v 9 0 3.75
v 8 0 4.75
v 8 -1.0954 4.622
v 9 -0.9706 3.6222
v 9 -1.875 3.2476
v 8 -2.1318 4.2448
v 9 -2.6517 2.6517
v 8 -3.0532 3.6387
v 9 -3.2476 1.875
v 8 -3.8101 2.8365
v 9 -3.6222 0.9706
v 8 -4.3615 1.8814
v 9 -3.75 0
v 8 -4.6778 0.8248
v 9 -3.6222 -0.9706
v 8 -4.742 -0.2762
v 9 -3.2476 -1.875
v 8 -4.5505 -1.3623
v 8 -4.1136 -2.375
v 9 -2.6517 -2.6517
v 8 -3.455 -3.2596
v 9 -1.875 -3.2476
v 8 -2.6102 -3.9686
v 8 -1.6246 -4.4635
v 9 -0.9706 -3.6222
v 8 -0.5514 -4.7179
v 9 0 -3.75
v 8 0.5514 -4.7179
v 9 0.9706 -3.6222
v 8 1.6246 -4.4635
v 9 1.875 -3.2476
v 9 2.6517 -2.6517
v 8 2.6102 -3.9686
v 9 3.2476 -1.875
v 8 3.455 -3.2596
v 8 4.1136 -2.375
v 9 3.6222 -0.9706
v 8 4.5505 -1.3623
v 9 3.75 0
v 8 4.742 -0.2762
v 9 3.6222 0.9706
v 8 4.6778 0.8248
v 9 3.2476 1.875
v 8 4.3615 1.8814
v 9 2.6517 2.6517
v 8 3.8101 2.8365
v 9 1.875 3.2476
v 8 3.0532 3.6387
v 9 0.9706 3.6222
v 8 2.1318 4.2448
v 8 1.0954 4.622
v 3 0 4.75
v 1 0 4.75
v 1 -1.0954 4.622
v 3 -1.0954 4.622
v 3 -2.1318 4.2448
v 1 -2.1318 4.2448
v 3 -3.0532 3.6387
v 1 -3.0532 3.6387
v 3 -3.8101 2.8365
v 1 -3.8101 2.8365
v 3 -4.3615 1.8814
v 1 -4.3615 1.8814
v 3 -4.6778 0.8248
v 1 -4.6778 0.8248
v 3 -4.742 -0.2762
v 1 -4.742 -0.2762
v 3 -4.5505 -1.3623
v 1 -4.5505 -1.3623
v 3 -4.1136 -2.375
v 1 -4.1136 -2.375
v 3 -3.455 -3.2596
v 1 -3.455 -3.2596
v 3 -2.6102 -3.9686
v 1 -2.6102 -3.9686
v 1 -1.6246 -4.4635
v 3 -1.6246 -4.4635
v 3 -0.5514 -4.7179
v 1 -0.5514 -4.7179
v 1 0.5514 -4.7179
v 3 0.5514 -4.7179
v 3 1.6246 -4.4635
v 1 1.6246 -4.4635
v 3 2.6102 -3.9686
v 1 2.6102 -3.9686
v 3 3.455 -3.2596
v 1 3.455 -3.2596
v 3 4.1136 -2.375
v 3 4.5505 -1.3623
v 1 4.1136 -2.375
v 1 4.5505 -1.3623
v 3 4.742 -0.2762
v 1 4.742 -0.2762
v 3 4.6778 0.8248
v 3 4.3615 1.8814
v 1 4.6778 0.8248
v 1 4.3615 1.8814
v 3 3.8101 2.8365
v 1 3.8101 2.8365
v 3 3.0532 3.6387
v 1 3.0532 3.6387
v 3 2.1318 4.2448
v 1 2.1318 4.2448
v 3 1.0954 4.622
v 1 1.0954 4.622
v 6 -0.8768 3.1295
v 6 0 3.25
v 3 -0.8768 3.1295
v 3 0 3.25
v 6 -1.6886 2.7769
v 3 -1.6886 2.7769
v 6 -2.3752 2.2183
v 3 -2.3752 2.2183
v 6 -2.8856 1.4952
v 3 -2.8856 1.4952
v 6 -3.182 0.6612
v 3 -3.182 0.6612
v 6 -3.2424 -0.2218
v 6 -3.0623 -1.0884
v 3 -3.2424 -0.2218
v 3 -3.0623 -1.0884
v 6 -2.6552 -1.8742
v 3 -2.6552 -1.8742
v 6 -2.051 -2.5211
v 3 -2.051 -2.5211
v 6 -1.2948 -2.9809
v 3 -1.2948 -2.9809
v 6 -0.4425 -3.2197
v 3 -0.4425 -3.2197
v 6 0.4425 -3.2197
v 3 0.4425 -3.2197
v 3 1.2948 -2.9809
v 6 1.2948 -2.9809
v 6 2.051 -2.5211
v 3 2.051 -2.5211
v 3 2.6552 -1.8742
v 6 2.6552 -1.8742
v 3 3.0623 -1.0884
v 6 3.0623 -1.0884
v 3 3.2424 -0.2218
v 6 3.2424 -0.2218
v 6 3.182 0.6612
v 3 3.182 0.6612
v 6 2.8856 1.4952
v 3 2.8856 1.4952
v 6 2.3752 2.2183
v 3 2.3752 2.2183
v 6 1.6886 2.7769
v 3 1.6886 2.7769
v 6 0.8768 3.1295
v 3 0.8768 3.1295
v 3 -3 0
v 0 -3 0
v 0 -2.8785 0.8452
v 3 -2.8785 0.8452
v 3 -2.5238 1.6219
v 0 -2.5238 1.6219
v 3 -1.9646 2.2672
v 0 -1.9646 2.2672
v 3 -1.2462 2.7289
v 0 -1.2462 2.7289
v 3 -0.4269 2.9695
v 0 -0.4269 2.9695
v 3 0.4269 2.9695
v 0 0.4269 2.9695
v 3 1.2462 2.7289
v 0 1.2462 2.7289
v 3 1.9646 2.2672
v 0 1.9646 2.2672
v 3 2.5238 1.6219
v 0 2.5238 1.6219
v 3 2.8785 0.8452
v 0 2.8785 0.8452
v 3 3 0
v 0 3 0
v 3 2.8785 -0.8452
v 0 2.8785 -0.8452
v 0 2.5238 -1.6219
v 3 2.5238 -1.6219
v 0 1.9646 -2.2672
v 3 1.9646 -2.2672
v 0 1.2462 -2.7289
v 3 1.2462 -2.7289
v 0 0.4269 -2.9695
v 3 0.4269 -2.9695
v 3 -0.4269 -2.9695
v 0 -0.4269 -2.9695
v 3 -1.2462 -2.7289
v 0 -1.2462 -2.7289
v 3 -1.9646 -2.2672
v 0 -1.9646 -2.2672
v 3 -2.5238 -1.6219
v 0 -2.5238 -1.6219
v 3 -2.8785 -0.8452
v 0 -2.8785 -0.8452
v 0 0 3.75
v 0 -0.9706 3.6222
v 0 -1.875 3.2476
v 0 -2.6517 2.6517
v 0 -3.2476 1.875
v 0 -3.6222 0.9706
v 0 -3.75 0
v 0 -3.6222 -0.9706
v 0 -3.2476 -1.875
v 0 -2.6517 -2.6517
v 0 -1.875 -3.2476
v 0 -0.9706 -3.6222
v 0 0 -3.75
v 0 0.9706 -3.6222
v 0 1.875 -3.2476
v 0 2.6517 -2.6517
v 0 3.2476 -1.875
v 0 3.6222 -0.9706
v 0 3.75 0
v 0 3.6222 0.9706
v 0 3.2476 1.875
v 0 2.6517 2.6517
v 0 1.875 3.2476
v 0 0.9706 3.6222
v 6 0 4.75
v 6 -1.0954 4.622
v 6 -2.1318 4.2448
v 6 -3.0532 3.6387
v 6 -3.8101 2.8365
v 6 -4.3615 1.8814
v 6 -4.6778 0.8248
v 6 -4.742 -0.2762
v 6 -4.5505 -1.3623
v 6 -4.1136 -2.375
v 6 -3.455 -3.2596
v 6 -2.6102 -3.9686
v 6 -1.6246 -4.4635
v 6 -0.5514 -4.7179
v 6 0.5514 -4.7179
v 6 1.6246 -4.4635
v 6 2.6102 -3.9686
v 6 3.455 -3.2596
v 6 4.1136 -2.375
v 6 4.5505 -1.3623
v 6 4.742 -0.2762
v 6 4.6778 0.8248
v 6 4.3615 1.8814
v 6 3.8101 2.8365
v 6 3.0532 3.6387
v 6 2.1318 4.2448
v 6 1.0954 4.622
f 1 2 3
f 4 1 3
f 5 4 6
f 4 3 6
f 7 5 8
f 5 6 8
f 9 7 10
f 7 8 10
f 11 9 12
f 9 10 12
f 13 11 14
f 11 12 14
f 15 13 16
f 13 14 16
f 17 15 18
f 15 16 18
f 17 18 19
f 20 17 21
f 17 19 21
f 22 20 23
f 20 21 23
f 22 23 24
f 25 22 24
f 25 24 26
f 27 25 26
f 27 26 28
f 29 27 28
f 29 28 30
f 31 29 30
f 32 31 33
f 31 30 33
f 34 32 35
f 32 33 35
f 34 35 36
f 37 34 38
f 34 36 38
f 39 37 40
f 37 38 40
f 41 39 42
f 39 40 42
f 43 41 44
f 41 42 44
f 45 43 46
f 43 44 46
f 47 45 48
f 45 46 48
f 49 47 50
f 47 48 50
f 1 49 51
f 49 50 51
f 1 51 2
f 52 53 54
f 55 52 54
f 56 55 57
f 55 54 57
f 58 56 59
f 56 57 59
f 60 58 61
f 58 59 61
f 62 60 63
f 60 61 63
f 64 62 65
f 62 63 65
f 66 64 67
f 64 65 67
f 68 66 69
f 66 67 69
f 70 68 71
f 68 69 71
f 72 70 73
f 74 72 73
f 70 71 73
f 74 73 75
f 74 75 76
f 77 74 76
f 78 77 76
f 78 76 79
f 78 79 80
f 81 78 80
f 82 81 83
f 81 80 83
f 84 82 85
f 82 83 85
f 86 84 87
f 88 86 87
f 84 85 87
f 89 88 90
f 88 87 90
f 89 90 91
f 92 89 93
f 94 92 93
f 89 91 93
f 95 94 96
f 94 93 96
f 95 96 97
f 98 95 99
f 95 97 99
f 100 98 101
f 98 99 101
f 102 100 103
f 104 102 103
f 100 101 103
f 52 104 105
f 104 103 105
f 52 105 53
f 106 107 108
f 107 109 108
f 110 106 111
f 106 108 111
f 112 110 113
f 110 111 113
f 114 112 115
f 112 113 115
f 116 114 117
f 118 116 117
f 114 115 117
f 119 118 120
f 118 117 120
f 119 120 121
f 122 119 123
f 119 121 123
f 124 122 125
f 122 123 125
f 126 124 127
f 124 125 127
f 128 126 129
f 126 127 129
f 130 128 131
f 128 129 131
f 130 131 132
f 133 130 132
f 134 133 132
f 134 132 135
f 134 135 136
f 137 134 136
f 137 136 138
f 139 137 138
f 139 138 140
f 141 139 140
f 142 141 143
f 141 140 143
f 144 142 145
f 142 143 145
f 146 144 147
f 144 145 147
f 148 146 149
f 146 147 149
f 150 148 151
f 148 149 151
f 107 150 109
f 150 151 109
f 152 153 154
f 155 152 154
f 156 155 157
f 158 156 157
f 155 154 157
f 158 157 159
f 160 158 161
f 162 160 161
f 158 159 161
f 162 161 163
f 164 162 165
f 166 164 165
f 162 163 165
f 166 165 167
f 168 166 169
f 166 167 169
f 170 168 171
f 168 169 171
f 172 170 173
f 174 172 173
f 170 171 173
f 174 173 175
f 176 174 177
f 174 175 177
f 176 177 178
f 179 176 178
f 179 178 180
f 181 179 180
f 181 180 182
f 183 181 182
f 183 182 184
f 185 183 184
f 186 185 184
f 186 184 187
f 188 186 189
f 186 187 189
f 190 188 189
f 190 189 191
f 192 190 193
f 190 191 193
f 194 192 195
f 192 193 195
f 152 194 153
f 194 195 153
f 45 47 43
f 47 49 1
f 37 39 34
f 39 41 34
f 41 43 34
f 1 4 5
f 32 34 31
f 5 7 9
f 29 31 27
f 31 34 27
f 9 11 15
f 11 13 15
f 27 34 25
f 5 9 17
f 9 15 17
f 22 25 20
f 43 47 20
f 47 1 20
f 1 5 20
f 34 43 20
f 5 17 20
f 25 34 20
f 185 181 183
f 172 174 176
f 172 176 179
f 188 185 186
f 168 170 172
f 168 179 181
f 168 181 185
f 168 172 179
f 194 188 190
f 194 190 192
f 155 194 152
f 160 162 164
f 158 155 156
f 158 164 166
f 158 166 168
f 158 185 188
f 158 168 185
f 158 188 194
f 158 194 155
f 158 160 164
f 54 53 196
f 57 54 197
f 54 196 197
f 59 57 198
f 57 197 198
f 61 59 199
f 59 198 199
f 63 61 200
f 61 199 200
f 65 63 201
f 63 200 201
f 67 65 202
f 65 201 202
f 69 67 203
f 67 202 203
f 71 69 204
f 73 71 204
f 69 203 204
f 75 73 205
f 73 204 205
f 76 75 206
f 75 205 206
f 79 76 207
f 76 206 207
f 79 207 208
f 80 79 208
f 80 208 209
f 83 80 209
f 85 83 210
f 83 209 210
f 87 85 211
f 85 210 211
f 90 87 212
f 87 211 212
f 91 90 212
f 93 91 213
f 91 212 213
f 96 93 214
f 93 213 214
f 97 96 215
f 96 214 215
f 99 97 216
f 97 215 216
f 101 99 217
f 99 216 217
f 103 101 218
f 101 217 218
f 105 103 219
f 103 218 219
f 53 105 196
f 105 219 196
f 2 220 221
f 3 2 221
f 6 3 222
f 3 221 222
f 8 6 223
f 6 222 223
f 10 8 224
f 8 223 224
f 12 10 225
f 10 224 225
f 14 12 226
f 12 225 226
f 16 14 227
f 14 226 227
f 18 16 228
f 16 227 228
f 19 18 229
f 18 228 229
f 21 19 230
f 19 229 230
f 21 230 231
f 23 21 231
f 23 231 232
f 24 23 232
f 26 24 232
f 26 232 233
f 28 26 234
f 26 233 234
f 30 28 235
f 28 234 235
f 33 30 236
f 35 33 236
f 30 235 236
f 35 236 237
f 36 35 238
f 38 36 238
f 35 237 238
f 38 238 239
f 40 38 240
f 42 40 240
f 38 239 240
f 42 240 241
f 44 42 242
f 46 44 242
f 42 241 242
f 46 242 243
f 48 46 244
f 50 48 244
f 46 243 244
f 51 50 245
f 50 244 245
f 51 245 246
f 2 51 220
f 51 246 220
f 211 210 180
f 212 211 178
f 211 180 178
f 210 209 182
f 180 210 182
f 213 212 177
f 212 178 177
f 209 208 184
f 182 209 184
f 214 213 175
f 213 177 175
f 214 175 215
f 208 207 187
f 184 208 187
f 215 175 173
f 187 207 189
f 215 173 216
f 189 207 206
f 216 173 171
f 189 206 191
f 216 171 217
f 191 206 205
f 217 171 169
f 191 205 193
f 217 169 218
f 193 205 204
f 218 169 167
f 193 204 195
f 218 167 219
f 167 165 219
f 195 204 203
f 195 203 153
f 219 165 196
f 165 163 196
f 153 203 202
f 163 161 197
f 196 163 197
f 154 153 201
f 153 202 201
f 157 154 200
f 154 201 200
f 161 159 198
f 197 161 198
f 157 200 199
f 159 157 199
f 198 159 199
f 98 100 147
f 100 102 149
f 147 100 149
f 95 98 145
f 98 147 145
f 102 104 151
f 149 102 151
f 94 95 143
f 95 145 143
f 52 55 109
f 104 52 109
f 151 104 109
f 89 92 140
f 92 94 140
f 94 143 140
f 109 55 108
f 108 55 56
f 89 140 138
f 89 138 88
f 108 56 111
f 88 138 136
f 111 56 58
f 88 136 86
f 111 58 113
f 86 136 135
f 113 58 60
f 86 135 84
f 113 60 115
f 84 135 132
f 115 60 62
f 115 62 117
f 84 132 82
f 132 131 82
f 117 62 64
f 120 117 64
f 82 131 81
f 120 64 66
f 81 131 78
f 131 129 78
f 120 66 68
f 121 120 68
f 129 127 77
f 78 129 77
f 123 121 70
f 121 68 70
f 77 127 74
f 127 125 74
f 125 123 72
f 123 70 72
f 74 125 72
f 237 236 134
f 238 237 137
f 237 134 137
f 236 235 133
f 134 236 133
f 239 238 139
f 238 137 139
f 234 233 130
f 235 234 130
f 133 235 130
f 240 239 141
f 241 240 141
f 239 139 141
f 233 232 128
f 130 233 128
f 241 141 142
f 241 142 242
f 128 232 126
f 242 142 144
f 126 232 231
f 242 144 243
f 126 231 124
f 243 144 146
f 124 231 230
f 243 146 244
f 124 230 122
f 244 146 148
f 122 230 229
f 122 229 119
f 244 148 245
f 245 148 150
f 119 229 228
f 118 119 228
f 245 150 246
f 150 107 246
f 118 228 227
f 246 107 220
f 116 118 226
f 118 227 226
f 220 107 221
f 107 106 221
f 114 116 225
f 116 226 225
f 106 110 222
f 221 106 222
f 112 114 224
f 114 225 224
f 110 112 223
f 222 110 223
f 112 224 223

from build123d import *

# Parameters (mm, degrees)
F2_SIZE  = 1
F3_R     = 3
F4_DEPTH = 3


with BuildPart() as f1:
    # F0 (on Front) → F1 (revolve)
    with BuildSketch(Plane.XZ):
        Polygon((3, 4.75), (0, 4.75), (0, 0), (9, 0), (9, 4.75), (6, 4.75), (6, 3.25), (3, 3.25), align=None)
    revolve(axis=Axis((4.5, 0, 0), (1, 0, 0)))

    # F2
    f2_edges = [f1.edges().sort_by_distance(p)[0] for p in [
        (0, 0, -4.75),
        (9, 0, -4.75),
    ]]
    chamfer(f2_edges, length=F2_SIZE)

    # F3 (on face) → F4 (cut)
    with BuildSketch(Plane(origin=(0, 0, 0), x_dir=(0, -1, 0), z_dir=(-1, 0, 0))):
        Circle(F3_R)
    extrude(amount=-F4_DEPTH, mode=Mode.SUBTRACT)


solid = f1.part
